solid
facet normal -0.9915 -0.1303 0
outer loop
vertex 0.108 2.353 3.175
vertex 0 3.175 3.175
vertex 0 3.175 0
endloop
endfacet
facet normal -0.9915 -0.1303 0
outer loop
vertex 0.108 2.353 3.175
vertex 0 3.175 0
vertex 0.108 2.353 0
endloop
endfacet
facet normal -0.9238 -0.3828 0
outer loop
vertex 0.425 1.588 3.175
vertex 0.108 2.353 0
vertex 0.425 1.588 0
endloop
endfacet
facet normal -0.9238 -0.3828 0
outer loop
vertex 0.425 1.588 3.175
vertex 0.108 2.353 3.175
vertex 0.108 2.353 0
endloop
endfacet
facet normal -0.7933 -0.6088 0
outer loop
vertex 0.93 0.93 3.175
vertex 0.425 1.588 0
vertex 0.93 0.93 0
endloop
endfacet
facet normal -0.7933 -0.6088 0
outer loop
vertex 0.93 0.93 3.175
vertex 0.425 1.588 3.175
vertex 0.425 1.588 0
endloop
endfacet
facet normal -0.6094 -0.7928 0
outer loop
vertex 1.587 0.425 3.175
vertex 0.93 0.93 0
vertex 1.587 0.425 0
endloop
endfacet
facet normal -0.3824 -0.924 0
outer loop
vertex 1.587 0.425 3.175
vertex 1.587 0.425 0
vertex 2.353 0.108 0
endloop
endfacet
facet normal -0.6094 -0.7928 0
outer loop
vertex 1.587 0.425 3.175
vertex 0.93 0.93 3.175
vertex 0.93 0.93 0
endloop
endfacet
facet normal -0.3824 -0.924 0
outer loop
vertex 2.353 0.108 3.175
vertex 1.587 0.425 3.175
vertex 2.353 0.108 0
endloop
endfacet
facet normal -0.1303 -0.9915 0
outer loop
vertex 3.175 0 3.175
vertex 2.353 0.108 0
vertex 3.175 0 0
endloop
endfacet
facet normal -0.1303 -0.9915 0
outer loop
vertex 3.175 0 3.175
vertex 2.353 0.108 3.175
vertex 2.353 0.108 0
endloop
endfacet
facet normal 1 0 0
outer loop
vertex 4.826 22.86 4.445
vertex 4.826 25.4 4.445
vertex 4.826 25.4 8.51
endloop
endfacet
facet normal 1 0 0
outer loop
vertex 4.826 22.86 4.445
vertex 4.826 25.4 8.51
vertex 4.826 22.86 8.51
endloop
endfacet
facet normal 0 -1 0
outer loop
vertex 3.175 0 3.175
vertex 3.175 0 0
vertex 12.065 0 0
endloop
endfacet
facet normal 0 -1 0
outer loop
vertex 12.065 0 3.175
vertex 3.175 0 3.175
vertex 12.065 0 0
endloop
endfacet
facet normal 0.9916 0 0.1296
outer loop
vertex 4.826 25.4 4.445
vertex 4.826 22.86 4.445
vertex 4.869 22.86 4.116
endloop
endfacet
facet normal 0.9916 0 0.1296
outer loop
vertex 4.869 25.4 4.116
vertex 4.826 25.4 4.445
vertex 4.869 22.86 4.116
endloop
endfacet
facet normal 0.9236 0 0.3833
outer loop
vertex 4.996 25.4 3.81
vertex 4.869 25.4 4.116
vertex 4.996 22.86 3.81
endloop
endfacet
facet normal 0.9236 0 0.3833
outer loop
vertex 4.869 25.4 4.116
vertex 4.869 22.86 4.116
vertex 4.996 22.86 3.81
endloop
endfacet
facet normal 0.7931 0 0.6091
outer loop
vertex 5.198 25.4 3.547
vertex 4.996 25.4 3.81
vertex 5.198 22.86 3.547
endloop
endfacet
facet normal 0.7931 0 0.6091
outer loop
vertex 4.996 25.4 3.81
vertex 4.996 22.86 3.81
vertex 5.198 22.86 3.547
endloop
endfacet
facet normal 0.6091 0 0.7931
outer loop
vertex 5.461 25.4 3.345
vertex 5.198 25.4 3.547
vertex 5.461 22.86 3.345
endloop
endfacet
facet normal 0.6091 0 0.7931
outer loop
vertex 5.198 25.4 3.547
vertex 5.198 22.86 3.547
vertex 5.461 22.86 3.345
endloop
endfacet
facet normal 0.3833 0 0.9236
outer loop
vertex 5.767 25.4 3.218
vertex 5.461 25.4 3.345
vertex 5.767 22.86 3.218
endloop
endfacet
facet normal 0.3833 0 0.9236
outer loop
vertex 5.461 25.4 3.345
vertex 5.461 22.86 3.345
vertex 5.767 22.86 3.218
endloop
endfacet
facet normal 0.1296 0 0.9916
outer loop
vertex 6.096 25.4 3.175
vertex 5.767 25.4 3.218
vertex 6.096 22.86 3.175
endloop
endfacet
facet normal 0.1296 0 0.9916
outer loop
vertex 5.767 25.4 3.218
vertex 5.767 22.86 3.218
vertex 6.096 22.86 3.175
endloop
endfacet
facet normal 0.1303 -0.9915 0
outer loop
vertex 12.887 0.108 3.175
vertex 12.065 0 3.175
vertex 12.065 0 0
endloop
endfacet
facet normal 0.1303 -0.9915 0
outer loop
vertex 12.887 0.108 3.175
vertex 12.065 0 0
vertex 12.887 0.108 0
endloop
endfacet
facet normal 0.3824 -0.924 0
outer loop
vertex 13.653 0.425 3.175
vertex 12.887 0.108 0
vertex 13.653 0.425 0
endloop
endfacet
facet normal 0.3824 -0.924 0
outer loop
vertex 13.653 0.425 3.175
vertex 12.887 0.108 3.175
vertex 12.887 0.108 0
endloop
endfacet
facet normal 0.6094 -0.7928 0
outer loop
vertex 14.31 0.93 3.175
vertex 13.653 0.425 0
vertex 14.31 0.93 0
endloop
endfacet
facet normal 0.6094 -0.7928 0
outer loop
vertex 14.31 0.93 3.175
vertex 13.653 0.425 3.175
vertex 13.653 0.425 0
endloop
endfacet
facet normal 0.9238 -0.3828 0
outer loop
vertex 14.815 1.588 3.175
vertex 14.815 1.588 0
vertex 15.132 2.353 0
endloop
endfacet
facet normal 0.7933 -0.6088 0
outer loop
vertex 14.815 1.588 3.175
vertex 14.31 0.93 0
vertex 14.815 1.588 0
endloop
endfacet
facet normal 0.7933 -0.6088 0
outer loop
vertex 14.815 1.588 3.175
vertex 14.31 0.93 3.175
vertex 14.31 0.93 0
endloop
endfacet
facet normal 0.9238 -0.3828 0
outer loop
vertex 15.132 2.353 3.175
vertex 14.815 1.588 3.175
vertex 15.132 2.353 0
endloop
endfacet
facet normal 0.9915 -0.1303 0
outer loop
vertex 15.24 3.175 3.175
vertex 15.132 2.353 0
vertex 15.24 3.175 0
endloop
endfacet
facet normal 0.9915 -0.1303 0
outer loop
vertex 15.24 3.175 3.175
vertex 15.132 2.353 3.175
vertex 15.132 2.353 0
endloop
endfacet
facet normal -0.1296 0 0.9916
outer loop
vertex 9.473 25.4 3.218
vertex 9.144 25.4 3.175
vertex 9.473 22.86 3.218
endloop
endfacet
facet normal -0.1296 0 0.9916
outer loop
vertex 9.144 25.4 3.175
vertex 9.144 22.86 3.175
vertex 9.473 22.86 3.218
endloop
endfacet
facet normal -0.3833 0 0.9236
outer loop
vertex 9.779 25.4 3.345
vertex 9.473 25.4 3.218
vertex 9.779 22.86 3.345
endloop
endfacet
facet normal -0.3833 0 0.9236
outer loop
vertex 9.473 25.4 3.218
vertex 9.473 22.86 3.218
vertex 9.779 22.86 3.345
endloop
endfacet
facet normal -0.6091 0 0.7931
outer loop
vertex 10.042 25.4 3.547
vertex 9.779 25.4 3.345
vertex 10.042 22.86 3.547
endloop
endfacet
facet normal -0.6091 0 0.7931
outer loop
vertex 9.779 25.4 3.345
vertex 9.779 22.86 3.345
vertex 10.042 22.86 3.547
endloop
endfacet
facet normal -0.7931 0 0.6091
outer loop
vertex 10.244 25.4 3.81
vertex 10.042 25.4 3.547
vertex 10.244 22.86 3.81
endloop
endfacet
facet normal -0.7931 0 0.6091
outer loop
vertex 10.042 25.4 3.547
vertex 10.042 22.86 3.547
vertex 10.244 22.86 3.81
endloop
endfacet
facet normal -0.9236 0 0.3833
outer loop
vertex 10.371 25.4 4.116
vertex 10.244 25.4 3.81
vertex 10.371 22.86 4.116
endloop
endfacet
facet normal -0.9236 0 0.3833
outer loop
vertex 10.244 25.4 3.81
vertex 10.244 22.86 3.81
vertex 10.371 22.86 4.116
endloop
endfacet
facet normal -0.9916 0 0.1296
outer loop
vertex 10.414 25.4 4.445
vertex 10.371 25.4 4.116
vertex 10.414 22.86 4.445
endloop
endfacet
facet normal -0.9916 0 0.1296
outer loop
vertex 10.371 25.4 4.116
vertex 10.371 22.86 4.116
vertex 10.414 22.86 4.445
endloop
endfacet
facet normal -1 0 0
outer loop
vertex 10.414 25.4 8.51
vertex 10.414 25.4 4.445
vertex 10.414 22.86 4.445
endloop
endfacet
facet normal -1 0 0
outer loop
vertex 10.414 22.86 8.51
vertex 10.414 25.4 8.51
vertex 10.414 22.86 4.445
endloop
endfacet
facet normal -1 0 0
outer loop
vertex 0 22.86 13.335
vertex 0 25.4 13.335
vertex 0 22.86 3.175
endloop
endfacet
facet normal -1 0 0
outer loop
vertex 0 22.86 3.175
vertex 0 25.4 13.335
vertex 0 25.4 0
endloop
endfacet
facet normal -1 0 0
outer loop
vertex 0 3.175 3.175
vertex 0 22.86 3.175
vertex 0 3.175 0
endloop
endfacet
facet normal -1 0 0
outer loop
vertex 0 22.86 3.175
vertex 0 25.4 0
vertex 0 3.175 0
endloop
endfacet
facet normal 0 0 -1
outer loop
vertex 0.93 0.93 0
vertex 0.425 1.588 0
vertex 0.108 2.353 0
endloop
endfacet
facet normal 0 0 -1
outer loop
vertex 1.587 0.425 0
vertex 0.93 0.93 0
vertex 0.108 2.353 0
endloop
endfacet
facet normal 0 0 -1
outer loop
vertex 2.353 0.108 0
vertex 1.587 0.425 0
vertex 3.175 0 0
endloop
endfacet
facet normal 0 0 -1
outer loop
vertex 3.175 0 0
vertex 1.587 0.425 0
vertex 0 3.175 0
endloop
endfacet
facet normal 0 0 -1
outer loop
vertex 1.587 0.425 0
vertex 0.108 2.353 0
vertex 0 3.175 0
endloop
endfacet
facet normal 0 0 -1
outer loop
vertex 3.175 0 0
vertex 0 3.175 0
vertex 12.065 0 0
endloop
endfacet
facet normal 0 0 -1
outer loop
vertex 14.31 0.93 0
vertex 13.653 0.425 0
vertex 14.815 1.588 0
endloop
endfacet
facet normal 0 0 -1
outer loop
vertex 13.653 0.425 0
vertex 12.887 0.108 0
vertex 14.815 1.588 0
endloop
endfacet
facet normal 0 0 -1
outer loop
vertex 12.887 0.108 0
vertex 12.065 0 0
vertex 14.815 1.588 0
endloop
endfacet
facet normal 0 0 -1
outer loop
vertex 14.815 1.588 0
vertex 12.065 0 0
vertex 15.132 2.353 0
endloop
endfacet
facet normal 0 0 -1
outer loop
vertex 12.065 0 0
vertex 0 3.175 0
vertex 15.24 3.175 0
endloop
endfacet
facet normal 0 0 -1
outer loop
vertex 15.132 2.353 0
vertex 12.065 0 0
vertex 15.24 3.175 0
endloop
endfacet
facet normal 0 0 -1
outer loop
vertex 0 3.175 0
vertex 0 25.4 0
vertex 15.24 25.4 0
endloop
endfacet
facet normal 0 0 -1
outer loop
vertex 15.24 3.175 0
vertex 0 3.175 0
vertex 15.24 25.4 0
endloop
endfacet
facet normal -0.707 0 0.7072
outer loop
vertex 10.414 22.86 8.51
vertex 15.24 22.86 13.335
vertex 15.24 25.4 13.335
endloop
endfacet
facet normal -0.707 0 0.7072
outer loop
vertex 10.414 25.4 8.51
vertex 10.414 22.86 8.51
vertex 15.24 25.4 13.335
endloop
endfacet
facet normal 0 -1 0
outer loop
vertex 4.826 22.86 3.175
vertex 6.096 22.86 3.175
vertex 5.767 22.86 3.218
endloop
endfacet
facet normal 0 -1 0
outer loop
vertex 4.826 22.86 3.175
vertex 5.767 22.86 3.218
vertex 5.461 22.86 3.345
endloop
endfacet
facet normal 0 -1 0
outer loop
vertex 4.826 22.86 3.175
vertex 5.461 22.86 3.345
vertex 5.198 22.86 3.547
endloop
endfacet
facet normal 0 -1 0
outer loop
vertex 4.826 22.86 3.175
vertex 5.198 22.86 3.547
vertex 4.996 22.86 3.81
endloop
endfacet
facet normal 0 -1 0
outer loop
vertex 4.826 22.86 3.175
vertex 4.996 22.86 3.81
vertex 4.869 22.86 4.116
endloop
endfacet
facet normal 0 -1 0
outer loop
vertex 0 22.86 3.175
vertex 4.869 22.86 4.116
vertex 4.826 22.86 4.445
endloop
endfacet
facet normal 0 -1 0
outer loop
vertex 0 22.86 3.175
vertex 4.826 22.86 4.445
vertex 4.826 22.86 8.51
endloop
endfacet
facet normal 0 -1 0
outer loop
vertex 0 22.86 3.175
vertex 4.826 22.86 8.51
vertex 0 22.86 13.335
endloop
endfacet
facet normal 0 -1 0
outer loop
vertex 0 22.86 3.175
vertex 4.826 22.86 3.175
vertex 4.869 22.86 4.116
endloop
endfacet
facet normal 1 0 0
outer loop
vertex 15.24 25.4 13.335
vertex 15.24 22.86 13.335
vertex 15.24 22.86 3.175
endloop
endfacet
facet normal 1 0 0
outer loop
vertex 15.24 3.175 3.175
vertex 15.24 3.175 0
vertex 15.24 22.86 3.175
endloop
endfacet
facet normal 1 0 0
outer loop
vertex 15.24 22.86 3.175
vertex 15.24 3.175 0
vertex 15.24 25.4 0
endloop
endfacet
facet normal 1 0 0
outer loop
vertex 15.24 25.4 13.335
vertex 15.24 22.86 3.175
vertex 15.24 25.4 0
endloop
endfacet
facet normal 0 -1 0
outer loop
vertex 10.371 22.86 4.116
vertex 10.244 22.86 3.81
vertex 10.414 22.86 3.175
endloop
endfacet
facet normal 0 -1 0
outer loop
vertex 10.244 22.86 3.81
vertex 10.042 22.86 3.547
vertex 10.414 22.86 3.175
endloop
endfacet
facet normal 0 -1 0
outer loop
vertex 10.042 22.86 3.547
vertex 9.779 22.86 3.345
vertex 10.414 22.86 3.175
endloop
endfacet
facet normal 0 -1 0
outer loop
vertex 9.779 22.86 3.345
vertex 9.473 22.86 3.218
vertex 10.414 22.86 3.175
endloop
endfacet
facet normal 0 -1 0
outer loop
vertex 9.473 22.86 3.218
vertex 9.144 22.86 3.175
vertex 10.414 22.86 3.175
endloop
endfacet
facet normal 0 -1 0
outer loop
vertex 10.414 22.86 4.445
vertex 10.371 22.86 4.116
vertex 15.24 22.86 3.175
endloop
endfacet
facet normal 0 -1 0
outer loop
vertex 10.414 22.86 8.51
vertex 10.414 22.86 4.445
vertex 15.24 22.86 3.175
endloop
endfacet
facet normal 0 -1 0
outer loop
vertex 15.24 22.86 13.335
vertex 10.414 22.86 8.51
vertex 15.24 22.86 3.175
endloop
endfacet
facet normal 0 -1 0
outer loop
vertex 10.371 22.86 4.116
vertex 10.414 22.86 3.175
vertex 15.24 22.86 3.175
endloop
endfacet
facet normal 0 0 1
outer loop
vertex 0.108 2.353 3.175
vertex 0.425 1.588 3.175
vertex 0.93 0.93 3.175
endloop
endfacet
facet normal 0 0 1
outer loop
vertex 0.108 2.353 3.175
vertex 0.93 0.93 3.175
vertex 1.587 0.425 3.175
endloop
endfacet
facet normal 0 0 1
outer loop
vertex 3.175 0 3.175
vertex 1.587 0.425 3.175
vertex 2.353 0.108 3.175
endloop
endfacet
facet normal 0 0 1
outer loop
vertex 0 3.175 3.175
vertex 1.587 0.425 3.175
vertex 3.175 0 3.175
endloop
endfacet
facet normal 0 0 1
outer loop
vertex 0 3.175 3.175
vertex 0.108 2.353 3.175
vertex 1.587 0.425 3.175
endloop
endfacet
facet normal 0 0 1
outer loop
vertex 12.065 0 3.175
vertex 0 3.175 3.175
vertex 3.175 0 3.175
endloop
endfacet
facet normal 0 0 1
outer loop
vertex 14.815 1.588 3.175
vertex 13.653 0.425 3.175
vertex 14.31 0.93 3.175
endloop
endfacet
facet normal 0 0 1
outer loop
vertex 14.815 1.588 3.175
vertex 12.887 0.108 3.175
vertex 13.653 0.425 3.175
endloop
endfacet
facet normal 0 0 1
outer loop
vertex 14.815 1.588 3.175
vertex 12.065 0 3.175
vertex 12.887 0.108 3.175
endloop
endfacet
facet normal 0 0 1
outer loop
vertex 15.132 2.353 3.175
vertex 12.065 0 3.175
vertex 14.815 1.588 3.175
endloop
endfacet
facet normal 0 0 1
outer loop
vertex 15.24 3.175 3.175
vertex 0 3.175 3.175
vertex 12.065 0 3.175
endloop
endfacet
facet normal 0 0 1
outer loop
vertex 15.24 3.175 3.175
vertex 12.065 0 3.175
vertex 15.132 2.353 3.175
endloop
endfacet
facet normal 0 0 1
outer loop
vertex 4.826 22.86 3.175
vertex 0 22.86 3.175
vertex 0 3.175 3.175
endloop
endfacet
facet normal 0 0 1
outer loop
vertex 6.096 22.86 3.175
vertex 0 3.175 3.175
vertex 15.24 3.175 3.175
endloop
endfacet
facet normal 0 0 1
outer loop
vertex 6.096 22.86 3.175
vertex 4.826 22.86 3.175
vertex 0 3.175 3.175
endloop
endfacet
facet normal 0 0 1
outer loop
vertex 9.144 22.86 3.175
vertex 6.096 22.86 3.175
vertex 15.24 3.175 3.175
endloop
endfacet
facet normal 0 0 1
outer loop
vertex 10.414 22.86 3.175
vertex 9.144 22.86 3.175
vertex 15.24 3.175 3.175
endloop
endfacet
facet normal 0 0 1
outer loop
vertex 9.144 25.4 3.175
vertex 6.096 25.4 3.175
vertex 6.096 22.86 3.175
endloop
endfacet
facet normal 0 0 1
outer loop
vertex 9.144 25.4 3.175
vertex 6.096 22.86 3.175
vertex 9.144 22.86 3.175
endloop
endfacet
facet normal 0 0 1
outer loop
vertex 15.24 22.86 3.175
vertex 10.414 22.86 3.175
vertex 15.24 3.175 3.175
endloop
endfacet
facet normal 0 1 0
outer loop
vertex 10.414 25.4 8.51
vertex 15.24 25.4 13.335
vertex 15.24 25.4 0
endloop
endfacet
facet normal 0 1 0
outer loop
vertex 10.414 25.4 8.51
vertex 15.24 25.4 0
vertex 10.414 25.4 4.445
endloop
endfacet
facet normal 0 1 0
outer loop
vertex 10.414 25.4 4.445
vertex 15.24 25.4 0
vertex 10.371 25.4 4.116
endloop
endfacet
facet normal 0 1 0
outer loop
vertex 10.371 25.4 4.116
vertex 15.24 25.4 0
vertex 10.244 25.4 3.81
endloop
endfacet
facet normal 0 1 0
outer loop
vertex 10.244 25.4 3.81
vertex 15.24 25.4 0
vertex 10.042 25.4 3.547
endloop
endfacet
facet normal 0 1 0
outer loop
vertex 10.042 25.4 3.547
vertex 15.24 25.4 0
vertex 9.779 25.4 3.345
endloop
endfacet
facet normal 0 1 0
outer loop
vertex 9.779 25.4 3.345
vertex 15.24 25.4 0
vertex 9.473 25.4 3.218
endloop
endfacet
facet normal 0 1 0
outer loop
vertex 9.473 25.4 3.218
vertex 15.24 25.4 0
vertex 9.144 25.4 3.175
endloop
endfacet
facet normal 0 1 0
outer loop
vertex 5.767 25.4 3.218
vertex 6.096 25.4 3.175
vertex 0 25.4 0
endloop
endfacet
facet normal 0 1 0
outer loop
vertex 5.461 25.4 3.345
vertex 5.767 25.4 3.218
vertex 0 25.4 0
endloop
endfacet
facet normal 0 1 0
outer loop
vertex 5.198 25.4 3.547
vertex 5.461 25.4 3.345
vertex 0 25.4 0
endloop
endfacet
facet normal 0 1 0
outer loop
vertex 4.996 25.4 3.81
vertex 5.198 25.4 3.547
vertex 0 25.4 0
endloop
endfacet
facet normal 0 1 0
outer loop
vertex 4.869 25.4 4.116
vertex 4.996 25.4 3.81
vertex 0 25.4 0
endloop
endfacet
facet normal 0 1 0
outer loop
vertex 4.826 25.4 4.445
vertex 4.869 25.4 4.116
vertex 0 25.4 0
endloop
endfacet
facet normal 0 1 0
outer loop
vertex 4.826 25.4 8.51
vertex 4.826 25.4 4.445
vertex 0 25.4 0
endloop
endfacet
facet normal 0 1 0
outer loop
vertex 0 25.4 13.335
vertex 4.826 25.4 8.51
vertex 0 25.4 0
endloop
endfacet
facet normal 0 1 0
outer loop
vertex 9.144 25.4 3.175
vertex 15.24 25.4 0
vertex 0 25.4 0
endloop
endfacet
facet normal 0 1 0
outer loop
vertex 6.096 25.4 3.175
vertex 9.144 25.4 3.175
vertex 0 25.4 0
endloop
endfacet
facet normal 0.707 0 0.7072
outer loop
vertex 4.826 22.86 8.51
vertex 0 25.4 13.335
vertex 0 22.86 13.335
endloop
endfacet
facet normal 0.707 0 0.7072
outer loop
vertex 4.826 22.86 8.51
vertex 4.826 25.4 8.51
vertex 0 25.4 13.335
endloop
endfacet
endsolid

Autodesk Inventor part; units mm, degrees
ref_plane "YZ Plane" through (0, 0, 0) normal (1, 0, 0) x (0, 1, 0)
ref_plane "XZ Plane" through (0, 0, 0) normal (0, 1, 0) x (-1, 0, 0)
ref_plane "XY Plane" through (0, 0, 0) normal (0, 0, 1) x (1, 0, 0)
sketch "Sketch1" plane through (0, 0, 0) normal (0, 0, 1) x (1, 0, 0)
  line L0 (0, 0) -> (15.24, 0)
  line L1 (15.24, 0) -> (15.24, 25.4)
  line L2 (15.24, 25.4) -> (0, 25.4)
  line L3 (0, 25.4) -> (0, 0)
  dimension "d0" = 15.24
  dimension "d1" = 25.4
extrude "Extrusion1" add sketch "Sketch1" along normal blind 3.175
sketch "Sketch2" plane through (0, 0, 3.175) normal (0, 0, 1) x (1, 0, 0)
  line L0 (15.24, 25.4) -> (0, 25.4) projected
  line L1 (0, 25.4) -> (4.826, 25.4)
  line L2 (4.826, 25.4) -> (4.826, 22.86)
  line L3 (4.826, 22.86) -> (0, 22.86)
  line L4 (0, 22.86) -> (0, 25.4)
  line L5 (15.24, 25.4) -> (0, 25.4) projected
  line L6 (15.24, 25.4) -> (10.414, 25.4)
  line L7 (10.414, 25.4) -> (10.414, 22.86)
  line L8 (10.414, 22.86) -> (15.24, 22.86)
  line L9 (15.24, 22.86) -> (15.24, 25.4)
  point P0 (0, 0)
  dimension "d4" = 4.826
  dimension "d5" = 2.54
  dimension "d6" = 4.826
extrude "Extrusion2" add sketch "Sketch2" along normal blind 10.16
chamfer "Chamfer1" distance 4.826 angle 45 2 edges at (4.826, 24.13, 13.335) (10.414, 24.13, 13.335)
fillet "Fillet1" radius 1.27 2 edges at (4.826, 24.13, 3.175) (10.414, 24.13, 3.175)
fillet "Fillet2" radius 3.175 2 edges at (15.24, 0, 1.5875) (0, 0, 1.5875)
properties part number "Cable managment."
